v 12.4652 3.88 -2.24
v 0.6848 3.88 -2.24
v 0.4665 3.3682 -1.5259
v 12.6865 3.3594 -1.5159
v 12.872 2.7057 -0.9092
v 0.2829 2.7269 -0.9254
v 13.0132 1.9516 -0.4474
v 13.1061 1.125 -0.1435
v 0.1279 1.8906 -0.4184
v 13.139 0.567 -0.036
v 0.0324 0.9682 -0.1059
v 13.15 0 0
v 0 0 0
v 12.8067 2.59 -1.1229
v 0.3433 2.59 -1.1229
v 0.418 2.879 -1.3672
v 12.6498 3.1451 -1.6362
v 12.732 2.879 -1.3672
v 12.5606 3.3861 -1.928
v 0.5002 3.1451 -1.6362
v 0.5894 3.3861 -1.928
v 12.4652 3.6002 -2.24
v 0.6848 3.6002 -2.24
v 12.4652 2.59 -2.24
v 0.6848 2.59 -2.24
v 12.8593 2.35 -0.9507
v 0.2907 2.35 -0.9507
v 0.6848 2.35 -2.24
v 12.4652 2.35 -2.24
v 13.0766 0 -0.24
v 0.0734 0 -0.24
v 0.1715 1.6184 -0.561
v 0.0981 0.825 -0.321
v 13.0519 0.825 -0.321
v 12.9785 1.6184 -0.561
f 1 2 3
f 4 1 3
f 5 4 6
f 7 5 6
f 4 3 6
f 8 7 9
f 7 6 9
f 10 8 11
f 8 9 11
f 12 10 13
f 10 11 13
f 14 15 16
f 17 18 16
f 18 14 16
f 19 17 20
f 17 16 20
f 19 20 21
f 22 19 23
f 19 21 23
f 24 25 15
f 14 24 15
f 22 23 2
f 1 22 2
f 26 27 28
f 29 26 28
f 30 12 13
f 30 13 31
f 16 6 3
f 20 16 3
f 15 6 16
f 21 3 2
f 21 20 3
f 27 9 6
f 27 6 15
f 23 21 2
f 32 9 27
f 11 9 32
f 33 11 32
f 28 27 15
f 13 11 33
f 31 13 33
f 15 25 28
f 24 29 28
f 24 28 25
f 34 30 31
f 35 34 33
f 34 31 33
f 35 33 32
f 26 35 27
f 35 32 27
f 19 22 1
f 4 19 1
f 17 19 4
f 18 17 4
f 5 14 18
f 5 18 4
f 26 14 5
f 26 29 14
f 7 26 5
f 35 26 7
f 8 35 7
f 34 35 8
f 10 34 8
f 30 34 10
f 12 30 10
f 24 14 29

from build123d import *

# Parameters (mm, degrees)
BOSS_EXTRUDE1_DEPTH     = 13.15
CUT_EXTRUDE2_DEPTH      = 14.892246039
CUT_EXTRUDE2_DEPTH_BACK = 13
SKETCH2_OUTSIDE_W       = 17.928
SKETCH2_OUTSIDE_H       = 7.018


with BuildPart() as part:
    # Sketch1 → Boss-Extrude1 (new body)
    with BuildSketch(Plane(origin=(0, 0, 0), x_dir=(0, 0, -1), z_dir=(1, 0, 0))):
        with BuildLine():
            Line((0, 0), (0.24, 0))
            ThreePointArc((0.24, 0), (0.421575008, 1.227565185), (0.9507497, 2.35))
            Line((0.9507497, 2.35), (2.24, 2.35))
            Line((2.24, 2.35), (2.24, 2.59))
            Line((2.24, 2.59), (1.122898476, 2.59))
            ThreePointArc((1.122898476, 2.59), (1.636238533, 3.145094281), (2.24, 3.600198407))
            Line((2.24, 3.600198407), (2.24, 3.88))
            ThreePointArc((2.24, 3.88), (0.60020249, 2.240089284), (0, 0))
        make_face()
    extrude(amount=BOSS_EXTRUDE1_DEPTH)

    # Sketch2 outside → Cut-Extrude2 (cut, two sides: drawn at the far end of the back side and taken through both)
    with BuildSketch(Plane(origin=(0, 0, 0), x_dir=(1, 0, 0), z_dir=(0, 1, 0)).offset(-CUT_EXTRUDE2_DEPTH_BACK)):
        with Locations((6.575, 1.12)):
            Rectangle(SKETCH2_OUTSIDE_W, SKETCH2_OUTSIDE_H)
        Polygon((0.917192044, 3), (12.232807956, 3), (13.15, 0), (0, 0), align=None, mode=Mode.SUBTRACT)
    extrude(amount=CUT_EXTRUDE2_DEPTH + CUT_EXTRUDE2_DEPTH_BACK, mode=Mode.SUBTRACT)


solid = part.part
